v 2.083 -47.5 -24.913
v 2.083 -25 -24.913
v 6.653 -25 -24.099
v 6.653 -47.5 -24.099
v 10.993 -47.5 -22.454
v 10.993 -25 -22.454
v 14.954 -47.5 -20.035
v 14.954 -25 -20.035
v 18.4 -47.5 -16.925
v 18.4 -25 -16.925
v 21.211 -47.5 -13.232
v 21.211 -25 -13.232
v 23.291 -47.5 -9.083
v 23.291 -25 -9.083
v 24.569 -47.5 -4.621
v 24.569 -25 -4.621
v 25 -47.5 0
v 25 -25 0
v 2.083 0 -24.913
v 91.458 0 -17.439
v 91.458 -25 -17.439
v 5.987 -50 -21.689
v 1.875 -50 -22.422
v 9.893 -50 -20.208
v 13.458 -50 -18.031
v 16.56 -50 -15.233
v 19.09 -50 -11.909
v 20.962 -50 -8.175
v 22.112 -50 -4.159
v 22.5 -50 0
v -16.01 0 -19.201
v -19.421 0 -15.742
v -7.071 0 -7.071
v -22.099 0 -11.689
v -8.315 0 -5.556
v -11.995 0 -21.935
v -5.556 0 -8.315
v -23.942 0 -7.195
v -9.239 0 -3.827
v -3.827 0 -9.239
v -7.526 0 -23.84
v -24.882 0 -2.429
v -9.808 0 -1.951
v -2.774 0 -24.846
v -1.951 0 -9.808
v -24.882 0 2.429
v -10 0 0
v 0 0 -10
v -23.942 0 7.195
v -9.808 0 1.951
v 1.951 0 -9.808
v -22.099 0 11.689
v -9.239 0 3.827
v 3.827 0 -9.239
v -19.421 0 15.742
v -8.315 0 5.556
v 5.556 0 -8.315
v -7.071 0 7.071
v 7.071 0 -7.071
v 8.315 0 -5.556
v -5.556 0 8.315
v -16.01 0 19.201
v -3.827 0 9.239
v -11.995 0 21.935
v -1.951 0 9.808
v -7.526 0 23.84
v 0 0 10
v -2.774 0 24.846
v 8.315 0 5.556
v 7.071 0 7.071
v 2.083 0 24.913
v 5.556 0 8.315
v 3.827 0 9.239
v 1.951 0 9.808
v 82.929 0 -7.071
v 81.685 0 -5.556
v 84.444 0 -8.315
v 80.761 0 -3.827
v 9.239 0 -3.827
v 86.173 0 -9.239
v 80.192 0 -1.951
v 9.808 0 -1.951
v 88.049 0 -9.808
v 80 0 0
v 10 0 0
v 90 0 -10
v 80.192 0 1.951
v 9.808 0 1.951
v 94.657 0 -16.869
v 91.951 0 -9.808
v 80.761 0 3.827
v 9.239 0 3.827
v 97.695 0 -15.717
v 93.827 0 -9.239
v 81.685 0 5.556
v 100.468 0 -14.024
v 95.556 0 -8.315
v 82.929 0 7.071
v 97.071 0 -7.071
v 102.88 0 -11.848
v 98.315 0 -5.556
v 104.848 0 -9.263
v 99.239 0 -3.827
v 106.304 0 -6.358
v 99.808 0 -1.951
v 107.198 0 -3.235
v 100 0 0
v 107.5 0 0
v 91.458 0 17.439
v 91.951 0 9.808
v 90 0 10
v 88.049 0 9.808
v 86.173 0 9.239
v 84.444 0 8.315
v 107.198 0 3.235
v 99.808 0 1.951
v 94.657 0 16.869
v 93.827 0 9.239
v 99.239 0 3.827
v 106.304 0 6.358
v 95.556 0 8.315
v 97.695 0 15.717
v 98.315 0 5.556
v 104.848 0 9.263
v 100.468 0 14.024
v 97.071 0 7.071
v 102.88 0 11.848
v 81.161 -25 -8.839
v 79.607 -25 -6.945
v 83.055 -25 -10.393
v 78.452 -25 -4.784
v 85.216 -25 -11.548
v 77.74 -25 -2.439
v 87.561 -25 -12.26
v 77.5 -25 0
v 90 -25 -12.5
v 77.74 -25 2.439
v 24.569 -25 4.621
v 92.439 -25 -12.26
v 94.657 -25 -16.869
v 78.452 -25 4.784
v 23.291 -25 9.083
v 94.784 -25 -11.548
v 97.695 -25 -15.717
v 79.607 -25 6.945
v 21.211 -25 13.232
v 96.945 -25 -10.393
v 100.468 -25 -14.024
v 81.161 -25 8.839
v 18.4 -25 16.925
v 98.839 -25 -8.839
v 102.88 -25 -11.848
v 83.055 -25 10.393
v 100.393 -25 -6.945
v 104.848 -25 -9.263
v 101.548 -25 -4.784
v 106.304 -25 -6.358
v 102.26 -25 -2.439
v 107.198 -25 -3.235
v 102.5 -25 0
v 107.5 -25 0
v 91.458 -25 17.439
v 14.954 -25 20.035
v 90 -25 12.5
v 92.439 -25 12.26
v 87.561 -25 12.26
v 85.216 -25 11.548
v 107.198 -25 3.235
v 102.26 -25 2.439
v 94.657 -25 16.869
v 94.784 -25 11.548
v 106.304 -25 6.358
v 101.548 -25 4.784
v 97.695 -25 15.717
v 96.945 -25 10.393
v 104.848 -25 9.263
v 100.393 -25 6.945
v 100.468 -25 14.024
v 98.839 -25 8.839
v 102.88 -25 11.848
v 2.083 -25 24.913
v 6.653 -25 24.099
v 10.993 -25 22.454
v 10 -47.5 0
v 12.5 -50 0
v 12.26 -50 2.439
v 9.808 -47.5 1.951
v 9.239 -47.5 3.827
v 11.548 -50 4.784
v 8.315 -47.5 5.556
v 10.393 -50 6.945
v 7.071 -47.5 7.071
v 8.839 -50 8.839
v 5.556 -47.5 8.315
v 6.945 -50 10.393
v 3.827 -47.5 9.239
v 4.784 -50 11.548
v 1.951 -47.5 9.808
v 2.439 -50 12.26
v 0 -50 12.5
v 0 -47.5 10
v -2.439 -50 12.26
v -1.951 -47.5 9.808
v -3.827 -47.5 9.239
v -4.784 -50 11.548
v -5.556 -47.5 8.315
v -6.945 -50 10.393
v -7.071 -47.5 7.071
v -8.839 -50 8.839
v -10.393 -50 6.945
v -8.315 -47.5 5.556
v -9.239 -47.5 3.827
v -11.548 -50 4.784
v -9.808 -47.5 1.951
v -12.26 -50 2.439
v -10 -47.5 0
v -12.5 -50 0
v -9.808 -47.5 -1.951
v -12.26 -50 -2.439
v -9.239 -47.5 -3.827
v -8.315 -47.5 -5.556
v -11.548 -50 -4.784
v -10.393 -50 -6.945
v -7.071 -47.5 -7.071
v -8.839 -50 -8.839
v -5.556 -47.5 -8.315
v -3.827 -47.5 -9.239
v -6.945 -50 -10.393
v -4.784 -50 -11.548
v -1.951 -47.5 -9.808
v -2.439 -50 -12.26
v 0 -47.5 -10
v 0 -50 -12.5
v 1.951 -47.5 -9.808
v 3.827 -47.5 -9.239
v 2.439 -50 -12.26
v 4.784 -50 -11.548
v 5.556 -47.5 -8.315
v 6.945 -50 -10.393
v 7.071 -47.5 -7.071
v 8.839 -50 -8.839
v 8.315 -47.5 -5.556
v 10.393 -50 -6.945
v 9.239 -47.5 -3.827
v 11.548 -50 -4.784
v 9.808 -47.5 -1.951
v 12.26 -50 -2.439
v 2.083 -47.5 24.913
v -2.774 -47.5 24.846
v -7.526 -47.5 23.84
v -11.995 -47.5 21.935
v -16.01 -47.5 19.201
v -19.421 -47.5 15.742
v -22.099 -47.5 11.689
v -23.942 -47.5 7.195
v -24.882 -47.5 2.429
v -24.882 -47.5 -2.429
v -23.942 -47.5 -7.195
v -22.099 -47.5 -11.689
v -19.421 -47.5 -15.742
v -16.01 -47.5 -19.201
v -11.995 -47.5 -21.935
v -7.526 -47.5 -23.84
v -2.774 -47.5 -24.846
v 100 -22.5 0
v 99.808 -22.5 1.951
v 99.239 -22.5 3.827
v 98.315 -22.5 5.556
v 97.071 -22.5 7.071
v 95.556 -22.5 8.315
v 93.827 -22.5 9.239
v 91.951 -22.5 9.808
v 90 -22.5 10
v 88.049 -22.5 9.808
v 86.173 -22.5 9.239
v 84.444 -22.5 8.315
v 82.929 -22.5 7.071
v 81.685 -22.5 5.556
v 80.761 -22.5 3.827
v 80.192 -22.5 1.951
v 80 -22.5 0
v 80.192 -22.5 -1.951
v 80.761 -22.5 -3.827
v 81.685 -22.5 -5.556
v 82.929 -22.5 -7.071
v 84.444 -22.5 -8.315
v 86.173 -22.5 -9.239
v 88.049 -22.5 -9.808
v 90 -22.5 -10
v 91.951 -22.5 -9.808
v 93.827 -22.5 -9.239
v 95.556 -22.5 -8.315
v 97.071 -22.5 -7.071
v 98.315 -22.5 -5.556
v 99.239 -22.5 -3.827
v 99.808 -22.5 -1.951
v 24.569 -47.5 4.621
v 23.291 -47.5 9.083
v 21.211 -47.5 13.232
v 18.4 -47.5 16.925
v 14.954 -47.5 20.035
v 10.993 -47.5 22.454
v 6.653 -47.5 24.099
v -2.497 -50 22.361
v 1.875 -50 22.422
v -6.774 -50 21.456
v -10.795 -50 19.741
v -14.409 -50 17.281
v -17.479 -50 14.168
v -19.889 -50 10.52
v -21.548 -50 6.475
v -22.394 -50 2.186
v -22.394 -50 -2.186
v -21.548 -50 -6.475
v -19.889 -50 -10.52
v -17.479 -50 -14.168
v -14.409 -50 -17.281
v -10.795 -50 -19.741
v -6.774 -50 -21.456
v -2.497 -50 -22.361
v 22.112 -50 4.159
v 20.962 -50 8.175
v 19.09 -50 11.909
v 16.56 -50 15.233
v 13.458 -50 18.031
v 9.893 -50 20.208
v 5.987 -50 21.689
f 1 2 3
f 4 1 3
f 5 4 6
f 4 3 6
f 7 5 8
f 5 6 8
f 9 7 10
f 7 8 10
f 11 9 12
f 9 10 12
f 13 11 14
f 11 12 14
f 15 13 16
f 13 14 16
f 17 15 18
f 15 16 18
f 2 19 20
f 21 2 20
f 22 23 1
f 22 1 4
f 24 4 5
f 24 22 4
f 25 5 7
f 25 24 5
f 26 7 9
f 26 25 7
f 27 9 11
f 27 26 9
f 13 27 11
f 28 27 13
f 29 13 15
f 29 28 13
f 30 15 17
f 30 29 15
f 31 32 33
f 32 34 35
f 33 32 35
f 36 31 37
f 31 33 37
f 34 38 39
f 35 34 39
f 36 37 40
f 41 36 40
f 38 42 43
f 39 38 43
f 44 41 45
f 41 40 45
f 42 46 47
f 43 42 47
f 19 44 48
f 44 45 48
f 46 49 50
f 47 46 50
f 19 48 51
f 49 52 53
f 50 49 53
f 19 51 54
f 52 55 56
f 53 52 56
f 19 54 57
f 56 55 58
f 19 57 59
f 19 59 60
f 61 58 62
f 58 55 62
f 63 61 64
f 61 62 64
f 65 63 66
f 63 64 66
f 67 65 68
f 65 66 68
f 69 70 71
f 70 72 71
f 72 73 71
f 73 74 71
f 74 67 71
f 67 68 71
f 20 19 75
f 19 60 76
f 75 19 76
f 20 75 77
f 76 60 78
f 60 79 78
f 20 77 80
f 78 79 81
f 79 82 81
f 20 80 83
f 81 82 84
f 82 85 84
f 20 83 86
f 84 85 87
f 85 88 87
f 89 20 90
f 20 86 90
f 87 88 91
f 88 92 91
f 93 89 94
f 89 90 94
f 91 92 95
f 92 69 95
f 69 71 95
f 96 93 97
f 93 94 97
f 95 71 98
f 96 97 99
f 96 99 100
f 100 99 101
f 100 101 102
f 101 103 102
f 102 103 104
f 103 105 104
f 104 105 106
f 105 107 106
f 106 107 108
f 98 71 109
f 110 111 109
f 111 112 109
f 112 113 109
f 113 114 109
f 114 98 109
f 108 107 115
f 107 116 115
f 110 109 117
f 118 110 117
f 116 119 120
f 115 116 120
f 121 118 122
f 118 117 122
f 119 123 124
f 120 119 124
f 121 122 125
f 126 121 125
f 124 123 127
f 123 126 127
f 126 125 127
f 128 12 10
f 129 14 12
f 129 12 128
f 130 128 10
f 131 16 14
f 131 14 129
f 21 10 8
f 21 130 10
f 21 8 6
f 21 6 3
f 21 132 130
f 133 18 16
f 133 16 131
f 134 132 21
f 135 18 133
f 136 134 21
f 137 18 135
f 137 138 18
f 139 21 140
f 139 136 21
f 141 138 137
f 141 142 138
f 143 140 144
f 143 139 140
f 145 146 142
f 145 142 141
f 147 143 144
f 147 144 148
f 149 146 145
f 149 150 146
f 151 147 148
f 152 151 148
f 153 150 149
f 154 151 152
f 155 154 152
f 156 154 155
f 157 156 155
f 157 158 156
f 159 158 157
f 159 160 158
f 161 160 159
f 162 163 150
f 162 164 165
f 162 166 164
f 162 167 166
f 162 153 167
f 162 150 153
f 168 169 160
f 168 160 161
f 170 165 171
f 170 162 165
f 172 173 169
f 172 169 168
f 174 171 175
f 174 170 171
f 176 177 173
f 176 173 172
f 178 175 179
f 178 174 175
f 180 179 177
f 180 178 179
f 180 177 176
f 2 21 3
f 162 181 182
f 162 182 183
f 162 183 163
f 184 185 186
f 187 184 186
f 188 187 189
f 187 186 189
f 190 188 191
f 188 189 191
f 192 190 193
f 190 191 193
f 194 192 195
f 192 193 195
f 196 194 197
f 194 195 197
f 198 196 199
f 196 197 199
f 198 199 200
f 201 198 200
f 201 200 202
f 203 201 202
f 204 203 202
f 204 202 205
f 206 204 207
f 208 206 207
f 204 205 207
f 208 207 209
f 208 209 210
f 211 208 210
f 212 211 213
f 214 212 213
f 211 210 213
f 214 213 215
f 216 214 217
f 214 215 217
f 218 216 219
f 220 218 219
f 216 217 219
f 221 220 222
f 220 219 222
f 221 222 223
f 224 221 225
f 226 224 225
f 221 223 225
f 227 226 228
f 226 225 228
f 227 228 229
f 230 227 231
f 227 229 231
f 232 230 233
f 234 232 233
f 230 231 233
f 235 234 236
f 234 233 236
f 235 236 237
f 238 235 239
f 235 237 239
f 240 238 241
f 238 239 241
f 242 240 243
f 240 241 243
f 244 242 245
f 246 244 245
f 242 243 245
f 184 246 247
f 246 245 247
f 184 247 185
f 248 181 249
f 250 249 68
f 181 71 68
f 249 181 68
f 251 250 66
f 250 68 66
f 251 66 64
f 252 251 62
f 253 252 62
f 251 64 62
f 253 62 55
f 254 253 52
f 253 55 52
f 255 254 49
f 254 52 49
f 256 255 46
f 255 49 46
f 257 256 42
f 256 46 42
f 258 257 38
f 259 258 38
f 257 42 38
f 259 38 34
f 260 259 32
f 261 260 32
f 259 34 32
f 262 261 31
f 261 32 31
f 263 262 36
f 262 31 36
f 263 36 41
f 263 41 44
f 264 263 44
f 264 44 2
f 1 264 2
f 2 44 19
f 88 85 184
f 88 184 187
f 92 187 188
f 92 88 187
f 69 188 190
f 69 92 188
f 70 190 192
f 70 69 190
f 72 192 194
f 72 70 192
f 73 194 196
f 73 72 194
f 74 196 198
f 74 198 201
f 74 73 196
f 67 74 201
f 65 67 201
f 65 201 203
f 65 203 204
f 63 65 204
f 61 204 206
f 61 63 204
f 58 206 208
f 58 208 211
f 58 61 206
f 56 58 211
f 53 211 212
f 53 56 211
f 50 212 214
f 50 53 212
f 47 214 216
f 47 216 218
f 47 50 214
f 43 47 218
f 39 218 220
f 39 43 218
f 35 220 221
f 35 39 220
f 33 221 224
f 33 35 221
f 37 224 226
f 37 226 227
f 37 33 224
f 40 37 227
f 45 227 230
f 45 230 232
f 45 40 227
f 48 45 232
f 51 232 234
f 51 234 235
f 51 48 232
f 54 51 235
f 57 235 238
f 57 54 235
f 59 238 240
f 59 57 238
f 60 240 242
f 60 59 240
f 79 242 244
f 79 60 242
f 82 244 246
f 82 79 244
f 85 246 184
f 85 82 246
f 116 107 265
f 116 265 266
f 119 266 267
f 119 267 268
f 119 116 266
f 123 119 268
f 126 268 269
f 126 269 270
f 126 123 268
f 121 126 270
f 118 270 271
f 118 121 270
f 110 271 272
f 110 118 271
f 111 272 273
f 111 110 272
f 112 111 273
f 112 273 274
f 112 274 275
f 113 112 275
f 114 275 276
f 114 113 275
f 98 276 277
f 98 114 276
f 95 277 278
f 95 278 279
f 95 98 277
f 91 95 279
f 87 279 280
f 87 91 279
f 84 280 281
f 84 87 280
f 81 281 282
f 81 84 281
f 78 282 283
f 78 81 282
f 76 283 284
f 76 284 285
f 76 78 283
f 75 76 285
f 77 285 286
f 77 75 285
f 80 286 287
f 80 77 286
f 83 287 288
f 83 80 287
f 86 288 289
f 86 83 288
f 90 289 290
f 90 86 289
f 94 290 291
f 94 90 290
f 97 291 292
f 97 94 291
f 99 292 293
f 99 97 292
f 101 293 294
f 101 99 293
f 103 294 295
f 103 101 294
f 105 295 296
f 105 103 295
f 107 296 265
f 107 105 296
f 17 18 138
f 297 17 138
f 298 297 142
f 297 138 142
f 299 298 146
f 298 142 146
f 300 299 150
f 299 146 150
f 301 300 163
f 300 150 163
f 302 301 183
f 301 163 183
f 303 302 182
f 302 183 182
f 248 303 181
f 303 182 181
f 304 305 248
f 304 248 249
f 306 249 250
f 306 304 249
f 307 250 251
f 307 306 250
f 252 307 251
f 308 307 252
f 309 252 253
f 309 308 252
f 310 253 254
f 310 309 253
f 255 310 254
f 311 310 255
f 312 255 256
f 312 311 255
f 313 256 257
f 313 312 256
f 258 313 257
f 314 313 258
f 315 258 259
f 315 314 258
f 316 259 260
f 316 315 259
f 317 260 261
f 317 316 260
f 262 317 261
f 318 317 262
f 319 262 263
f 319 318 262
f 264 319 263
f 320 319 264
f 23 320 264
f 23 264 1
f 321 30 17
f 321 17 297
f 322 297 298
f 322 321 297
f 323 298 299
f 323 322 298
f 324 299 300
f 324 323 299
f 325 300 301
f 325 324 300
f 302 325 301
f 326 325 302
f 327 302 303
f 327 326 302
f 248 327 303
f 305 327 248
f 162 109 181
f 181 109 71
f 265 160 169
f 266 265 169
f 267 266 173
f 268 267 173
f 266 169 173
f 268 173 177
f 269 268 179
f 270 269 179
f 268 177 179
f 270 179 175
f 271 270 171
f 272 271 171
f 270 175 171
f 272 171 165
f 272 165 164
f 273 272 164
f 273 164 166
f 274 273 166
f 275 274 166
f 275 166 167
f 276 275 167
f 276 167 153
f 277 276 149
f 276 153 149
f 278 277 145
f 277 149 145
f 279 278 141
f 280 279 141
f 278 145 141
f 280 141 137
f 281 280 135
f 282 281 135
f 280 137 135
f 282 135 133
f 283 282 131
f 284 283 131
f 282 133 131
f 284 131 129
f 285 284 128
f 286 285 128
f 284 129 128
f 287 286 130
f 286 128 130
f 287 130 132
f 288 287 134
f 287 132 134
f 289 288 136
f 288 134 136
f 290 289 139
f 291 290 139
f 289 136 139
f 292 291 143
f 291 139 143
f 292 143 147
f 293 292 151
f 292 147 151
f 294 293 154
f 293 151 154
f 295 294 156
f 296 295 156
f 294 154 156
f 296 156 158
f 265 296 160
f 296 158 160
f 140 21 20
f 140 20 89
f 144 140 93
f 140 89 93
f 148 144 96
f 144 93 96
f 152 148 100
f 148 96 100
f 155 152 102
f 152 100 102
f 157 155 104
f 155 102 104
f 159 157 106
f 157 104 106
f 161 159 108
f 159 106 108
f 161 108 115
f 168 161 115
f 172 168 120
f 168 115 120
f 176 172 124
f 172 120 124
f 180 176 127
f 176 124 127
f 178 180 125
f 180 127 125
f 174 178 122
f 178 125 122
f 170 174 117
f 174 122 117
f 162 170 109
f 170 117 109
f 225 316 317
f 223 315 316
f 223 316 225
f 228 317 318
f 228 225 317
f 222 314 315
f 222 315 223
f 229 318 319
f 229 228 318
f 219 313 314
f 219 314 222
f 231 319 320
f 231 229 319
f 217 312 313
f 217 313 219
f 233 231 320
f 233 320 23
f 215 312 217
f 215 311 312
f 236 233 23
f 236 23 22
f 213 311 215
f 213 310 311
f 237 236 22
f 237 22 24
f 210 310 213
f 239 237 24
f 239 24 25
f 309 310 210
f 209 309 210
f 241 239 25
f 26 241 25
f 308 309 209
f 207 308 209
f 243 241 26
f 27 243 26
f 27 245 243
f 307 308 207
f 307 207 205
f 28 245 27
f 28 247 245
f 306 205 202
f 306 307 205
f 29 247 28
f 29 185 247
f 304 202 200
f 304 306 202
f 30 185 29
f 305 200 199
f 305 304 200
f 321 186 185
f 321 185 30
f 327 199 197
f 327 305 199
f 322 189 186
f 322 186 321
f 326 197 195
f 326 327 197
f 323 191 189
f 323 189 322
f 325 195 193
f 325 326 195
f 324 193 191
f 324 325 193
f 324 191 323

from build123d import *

# Parameters (mm, degrees)
F0_R     = 10
F1_DEPTH = 25
F2_DEPTH = 50
F3_SIZE  = 2.5


with BuildPart() as f1:
    # F0 (on Front) → F1 (new body)
    with BuildSketch(Plane.XZ):
        with BuildLine():
            ThreePointArc((2.083333, 24.913043), (18.399502, 16.92508), (25, 0))
            ThreePointArc((25, 0), (18.399502, -16.92508), (2.083333, -24.913043))
            Line((2.083333, -24.913043), (91.458333, -17.43913))
            ThreePointArc((91.458333, -17.43913), (72.5, 0), (91.458333, 17.43913))
            Line((91.458333, 17.43913), (2.083333, 24.913043))
        make_face()
        with BuildLine():
            ThreePointArc((2.083333, -24.913043), (18.399502, -16.92508), (25, 0))
            ThreePointArc((25, 0), (18.399502, 16.92508), (2.083333, 24.913043))
            ThreePointArc((2.083333, 24.913043), (-25, 0), (2.083333, -24.913043))
        make_face()
        Circle(F0_R, mode=Mode.SUBTRACT)
        with BuildLine():
            ThreePointArc((107.5, 0), (102.879651, 11.847556), (91.458333, 17.43913))
            ThreePointArc((91.458333, 17.43913), (72.5, 0), (91.458333, -17.43913))
            ThreePointArc((91.458333, -17.43913), (102.879651, -11.847556), (107.5, 0))
        make_face()
        with Locations((90, 0)):
            Circle(F0_R, mode=Mode.SUBTRACT)
    extrude(amount=F1_DEPTH)

    # F0 (on Front) → F2 (join)
    with BuildSketch(Plane.XZ):
        with BuildLine():
            ThreePointArc((2.083333, -24.913043), (18.399502, -16.92508), (25, 0))
            ThreePointArc((25, 0), (18.399502, 16.92508), (2.083333, 24.913043))
            ThreePointArc((2.083333, 24.913043), (-25, 0), (2.083333, -24.913043))
        make_face()
        Circle(F0_R, mode=Mode.SUBTRACT)
    extrude(amount=F2_DEPTH)

    # F3
    f3_edges = [f1.edges().sort_by_distance(p)[0] for p in [
        (-2.083333, -50, 24.913043),
        (-10, -50, 0),
        (80, -25, 0),
    ]]
    chamfer(f3_edges, length=F3_SIZE)


solid = f1.part
